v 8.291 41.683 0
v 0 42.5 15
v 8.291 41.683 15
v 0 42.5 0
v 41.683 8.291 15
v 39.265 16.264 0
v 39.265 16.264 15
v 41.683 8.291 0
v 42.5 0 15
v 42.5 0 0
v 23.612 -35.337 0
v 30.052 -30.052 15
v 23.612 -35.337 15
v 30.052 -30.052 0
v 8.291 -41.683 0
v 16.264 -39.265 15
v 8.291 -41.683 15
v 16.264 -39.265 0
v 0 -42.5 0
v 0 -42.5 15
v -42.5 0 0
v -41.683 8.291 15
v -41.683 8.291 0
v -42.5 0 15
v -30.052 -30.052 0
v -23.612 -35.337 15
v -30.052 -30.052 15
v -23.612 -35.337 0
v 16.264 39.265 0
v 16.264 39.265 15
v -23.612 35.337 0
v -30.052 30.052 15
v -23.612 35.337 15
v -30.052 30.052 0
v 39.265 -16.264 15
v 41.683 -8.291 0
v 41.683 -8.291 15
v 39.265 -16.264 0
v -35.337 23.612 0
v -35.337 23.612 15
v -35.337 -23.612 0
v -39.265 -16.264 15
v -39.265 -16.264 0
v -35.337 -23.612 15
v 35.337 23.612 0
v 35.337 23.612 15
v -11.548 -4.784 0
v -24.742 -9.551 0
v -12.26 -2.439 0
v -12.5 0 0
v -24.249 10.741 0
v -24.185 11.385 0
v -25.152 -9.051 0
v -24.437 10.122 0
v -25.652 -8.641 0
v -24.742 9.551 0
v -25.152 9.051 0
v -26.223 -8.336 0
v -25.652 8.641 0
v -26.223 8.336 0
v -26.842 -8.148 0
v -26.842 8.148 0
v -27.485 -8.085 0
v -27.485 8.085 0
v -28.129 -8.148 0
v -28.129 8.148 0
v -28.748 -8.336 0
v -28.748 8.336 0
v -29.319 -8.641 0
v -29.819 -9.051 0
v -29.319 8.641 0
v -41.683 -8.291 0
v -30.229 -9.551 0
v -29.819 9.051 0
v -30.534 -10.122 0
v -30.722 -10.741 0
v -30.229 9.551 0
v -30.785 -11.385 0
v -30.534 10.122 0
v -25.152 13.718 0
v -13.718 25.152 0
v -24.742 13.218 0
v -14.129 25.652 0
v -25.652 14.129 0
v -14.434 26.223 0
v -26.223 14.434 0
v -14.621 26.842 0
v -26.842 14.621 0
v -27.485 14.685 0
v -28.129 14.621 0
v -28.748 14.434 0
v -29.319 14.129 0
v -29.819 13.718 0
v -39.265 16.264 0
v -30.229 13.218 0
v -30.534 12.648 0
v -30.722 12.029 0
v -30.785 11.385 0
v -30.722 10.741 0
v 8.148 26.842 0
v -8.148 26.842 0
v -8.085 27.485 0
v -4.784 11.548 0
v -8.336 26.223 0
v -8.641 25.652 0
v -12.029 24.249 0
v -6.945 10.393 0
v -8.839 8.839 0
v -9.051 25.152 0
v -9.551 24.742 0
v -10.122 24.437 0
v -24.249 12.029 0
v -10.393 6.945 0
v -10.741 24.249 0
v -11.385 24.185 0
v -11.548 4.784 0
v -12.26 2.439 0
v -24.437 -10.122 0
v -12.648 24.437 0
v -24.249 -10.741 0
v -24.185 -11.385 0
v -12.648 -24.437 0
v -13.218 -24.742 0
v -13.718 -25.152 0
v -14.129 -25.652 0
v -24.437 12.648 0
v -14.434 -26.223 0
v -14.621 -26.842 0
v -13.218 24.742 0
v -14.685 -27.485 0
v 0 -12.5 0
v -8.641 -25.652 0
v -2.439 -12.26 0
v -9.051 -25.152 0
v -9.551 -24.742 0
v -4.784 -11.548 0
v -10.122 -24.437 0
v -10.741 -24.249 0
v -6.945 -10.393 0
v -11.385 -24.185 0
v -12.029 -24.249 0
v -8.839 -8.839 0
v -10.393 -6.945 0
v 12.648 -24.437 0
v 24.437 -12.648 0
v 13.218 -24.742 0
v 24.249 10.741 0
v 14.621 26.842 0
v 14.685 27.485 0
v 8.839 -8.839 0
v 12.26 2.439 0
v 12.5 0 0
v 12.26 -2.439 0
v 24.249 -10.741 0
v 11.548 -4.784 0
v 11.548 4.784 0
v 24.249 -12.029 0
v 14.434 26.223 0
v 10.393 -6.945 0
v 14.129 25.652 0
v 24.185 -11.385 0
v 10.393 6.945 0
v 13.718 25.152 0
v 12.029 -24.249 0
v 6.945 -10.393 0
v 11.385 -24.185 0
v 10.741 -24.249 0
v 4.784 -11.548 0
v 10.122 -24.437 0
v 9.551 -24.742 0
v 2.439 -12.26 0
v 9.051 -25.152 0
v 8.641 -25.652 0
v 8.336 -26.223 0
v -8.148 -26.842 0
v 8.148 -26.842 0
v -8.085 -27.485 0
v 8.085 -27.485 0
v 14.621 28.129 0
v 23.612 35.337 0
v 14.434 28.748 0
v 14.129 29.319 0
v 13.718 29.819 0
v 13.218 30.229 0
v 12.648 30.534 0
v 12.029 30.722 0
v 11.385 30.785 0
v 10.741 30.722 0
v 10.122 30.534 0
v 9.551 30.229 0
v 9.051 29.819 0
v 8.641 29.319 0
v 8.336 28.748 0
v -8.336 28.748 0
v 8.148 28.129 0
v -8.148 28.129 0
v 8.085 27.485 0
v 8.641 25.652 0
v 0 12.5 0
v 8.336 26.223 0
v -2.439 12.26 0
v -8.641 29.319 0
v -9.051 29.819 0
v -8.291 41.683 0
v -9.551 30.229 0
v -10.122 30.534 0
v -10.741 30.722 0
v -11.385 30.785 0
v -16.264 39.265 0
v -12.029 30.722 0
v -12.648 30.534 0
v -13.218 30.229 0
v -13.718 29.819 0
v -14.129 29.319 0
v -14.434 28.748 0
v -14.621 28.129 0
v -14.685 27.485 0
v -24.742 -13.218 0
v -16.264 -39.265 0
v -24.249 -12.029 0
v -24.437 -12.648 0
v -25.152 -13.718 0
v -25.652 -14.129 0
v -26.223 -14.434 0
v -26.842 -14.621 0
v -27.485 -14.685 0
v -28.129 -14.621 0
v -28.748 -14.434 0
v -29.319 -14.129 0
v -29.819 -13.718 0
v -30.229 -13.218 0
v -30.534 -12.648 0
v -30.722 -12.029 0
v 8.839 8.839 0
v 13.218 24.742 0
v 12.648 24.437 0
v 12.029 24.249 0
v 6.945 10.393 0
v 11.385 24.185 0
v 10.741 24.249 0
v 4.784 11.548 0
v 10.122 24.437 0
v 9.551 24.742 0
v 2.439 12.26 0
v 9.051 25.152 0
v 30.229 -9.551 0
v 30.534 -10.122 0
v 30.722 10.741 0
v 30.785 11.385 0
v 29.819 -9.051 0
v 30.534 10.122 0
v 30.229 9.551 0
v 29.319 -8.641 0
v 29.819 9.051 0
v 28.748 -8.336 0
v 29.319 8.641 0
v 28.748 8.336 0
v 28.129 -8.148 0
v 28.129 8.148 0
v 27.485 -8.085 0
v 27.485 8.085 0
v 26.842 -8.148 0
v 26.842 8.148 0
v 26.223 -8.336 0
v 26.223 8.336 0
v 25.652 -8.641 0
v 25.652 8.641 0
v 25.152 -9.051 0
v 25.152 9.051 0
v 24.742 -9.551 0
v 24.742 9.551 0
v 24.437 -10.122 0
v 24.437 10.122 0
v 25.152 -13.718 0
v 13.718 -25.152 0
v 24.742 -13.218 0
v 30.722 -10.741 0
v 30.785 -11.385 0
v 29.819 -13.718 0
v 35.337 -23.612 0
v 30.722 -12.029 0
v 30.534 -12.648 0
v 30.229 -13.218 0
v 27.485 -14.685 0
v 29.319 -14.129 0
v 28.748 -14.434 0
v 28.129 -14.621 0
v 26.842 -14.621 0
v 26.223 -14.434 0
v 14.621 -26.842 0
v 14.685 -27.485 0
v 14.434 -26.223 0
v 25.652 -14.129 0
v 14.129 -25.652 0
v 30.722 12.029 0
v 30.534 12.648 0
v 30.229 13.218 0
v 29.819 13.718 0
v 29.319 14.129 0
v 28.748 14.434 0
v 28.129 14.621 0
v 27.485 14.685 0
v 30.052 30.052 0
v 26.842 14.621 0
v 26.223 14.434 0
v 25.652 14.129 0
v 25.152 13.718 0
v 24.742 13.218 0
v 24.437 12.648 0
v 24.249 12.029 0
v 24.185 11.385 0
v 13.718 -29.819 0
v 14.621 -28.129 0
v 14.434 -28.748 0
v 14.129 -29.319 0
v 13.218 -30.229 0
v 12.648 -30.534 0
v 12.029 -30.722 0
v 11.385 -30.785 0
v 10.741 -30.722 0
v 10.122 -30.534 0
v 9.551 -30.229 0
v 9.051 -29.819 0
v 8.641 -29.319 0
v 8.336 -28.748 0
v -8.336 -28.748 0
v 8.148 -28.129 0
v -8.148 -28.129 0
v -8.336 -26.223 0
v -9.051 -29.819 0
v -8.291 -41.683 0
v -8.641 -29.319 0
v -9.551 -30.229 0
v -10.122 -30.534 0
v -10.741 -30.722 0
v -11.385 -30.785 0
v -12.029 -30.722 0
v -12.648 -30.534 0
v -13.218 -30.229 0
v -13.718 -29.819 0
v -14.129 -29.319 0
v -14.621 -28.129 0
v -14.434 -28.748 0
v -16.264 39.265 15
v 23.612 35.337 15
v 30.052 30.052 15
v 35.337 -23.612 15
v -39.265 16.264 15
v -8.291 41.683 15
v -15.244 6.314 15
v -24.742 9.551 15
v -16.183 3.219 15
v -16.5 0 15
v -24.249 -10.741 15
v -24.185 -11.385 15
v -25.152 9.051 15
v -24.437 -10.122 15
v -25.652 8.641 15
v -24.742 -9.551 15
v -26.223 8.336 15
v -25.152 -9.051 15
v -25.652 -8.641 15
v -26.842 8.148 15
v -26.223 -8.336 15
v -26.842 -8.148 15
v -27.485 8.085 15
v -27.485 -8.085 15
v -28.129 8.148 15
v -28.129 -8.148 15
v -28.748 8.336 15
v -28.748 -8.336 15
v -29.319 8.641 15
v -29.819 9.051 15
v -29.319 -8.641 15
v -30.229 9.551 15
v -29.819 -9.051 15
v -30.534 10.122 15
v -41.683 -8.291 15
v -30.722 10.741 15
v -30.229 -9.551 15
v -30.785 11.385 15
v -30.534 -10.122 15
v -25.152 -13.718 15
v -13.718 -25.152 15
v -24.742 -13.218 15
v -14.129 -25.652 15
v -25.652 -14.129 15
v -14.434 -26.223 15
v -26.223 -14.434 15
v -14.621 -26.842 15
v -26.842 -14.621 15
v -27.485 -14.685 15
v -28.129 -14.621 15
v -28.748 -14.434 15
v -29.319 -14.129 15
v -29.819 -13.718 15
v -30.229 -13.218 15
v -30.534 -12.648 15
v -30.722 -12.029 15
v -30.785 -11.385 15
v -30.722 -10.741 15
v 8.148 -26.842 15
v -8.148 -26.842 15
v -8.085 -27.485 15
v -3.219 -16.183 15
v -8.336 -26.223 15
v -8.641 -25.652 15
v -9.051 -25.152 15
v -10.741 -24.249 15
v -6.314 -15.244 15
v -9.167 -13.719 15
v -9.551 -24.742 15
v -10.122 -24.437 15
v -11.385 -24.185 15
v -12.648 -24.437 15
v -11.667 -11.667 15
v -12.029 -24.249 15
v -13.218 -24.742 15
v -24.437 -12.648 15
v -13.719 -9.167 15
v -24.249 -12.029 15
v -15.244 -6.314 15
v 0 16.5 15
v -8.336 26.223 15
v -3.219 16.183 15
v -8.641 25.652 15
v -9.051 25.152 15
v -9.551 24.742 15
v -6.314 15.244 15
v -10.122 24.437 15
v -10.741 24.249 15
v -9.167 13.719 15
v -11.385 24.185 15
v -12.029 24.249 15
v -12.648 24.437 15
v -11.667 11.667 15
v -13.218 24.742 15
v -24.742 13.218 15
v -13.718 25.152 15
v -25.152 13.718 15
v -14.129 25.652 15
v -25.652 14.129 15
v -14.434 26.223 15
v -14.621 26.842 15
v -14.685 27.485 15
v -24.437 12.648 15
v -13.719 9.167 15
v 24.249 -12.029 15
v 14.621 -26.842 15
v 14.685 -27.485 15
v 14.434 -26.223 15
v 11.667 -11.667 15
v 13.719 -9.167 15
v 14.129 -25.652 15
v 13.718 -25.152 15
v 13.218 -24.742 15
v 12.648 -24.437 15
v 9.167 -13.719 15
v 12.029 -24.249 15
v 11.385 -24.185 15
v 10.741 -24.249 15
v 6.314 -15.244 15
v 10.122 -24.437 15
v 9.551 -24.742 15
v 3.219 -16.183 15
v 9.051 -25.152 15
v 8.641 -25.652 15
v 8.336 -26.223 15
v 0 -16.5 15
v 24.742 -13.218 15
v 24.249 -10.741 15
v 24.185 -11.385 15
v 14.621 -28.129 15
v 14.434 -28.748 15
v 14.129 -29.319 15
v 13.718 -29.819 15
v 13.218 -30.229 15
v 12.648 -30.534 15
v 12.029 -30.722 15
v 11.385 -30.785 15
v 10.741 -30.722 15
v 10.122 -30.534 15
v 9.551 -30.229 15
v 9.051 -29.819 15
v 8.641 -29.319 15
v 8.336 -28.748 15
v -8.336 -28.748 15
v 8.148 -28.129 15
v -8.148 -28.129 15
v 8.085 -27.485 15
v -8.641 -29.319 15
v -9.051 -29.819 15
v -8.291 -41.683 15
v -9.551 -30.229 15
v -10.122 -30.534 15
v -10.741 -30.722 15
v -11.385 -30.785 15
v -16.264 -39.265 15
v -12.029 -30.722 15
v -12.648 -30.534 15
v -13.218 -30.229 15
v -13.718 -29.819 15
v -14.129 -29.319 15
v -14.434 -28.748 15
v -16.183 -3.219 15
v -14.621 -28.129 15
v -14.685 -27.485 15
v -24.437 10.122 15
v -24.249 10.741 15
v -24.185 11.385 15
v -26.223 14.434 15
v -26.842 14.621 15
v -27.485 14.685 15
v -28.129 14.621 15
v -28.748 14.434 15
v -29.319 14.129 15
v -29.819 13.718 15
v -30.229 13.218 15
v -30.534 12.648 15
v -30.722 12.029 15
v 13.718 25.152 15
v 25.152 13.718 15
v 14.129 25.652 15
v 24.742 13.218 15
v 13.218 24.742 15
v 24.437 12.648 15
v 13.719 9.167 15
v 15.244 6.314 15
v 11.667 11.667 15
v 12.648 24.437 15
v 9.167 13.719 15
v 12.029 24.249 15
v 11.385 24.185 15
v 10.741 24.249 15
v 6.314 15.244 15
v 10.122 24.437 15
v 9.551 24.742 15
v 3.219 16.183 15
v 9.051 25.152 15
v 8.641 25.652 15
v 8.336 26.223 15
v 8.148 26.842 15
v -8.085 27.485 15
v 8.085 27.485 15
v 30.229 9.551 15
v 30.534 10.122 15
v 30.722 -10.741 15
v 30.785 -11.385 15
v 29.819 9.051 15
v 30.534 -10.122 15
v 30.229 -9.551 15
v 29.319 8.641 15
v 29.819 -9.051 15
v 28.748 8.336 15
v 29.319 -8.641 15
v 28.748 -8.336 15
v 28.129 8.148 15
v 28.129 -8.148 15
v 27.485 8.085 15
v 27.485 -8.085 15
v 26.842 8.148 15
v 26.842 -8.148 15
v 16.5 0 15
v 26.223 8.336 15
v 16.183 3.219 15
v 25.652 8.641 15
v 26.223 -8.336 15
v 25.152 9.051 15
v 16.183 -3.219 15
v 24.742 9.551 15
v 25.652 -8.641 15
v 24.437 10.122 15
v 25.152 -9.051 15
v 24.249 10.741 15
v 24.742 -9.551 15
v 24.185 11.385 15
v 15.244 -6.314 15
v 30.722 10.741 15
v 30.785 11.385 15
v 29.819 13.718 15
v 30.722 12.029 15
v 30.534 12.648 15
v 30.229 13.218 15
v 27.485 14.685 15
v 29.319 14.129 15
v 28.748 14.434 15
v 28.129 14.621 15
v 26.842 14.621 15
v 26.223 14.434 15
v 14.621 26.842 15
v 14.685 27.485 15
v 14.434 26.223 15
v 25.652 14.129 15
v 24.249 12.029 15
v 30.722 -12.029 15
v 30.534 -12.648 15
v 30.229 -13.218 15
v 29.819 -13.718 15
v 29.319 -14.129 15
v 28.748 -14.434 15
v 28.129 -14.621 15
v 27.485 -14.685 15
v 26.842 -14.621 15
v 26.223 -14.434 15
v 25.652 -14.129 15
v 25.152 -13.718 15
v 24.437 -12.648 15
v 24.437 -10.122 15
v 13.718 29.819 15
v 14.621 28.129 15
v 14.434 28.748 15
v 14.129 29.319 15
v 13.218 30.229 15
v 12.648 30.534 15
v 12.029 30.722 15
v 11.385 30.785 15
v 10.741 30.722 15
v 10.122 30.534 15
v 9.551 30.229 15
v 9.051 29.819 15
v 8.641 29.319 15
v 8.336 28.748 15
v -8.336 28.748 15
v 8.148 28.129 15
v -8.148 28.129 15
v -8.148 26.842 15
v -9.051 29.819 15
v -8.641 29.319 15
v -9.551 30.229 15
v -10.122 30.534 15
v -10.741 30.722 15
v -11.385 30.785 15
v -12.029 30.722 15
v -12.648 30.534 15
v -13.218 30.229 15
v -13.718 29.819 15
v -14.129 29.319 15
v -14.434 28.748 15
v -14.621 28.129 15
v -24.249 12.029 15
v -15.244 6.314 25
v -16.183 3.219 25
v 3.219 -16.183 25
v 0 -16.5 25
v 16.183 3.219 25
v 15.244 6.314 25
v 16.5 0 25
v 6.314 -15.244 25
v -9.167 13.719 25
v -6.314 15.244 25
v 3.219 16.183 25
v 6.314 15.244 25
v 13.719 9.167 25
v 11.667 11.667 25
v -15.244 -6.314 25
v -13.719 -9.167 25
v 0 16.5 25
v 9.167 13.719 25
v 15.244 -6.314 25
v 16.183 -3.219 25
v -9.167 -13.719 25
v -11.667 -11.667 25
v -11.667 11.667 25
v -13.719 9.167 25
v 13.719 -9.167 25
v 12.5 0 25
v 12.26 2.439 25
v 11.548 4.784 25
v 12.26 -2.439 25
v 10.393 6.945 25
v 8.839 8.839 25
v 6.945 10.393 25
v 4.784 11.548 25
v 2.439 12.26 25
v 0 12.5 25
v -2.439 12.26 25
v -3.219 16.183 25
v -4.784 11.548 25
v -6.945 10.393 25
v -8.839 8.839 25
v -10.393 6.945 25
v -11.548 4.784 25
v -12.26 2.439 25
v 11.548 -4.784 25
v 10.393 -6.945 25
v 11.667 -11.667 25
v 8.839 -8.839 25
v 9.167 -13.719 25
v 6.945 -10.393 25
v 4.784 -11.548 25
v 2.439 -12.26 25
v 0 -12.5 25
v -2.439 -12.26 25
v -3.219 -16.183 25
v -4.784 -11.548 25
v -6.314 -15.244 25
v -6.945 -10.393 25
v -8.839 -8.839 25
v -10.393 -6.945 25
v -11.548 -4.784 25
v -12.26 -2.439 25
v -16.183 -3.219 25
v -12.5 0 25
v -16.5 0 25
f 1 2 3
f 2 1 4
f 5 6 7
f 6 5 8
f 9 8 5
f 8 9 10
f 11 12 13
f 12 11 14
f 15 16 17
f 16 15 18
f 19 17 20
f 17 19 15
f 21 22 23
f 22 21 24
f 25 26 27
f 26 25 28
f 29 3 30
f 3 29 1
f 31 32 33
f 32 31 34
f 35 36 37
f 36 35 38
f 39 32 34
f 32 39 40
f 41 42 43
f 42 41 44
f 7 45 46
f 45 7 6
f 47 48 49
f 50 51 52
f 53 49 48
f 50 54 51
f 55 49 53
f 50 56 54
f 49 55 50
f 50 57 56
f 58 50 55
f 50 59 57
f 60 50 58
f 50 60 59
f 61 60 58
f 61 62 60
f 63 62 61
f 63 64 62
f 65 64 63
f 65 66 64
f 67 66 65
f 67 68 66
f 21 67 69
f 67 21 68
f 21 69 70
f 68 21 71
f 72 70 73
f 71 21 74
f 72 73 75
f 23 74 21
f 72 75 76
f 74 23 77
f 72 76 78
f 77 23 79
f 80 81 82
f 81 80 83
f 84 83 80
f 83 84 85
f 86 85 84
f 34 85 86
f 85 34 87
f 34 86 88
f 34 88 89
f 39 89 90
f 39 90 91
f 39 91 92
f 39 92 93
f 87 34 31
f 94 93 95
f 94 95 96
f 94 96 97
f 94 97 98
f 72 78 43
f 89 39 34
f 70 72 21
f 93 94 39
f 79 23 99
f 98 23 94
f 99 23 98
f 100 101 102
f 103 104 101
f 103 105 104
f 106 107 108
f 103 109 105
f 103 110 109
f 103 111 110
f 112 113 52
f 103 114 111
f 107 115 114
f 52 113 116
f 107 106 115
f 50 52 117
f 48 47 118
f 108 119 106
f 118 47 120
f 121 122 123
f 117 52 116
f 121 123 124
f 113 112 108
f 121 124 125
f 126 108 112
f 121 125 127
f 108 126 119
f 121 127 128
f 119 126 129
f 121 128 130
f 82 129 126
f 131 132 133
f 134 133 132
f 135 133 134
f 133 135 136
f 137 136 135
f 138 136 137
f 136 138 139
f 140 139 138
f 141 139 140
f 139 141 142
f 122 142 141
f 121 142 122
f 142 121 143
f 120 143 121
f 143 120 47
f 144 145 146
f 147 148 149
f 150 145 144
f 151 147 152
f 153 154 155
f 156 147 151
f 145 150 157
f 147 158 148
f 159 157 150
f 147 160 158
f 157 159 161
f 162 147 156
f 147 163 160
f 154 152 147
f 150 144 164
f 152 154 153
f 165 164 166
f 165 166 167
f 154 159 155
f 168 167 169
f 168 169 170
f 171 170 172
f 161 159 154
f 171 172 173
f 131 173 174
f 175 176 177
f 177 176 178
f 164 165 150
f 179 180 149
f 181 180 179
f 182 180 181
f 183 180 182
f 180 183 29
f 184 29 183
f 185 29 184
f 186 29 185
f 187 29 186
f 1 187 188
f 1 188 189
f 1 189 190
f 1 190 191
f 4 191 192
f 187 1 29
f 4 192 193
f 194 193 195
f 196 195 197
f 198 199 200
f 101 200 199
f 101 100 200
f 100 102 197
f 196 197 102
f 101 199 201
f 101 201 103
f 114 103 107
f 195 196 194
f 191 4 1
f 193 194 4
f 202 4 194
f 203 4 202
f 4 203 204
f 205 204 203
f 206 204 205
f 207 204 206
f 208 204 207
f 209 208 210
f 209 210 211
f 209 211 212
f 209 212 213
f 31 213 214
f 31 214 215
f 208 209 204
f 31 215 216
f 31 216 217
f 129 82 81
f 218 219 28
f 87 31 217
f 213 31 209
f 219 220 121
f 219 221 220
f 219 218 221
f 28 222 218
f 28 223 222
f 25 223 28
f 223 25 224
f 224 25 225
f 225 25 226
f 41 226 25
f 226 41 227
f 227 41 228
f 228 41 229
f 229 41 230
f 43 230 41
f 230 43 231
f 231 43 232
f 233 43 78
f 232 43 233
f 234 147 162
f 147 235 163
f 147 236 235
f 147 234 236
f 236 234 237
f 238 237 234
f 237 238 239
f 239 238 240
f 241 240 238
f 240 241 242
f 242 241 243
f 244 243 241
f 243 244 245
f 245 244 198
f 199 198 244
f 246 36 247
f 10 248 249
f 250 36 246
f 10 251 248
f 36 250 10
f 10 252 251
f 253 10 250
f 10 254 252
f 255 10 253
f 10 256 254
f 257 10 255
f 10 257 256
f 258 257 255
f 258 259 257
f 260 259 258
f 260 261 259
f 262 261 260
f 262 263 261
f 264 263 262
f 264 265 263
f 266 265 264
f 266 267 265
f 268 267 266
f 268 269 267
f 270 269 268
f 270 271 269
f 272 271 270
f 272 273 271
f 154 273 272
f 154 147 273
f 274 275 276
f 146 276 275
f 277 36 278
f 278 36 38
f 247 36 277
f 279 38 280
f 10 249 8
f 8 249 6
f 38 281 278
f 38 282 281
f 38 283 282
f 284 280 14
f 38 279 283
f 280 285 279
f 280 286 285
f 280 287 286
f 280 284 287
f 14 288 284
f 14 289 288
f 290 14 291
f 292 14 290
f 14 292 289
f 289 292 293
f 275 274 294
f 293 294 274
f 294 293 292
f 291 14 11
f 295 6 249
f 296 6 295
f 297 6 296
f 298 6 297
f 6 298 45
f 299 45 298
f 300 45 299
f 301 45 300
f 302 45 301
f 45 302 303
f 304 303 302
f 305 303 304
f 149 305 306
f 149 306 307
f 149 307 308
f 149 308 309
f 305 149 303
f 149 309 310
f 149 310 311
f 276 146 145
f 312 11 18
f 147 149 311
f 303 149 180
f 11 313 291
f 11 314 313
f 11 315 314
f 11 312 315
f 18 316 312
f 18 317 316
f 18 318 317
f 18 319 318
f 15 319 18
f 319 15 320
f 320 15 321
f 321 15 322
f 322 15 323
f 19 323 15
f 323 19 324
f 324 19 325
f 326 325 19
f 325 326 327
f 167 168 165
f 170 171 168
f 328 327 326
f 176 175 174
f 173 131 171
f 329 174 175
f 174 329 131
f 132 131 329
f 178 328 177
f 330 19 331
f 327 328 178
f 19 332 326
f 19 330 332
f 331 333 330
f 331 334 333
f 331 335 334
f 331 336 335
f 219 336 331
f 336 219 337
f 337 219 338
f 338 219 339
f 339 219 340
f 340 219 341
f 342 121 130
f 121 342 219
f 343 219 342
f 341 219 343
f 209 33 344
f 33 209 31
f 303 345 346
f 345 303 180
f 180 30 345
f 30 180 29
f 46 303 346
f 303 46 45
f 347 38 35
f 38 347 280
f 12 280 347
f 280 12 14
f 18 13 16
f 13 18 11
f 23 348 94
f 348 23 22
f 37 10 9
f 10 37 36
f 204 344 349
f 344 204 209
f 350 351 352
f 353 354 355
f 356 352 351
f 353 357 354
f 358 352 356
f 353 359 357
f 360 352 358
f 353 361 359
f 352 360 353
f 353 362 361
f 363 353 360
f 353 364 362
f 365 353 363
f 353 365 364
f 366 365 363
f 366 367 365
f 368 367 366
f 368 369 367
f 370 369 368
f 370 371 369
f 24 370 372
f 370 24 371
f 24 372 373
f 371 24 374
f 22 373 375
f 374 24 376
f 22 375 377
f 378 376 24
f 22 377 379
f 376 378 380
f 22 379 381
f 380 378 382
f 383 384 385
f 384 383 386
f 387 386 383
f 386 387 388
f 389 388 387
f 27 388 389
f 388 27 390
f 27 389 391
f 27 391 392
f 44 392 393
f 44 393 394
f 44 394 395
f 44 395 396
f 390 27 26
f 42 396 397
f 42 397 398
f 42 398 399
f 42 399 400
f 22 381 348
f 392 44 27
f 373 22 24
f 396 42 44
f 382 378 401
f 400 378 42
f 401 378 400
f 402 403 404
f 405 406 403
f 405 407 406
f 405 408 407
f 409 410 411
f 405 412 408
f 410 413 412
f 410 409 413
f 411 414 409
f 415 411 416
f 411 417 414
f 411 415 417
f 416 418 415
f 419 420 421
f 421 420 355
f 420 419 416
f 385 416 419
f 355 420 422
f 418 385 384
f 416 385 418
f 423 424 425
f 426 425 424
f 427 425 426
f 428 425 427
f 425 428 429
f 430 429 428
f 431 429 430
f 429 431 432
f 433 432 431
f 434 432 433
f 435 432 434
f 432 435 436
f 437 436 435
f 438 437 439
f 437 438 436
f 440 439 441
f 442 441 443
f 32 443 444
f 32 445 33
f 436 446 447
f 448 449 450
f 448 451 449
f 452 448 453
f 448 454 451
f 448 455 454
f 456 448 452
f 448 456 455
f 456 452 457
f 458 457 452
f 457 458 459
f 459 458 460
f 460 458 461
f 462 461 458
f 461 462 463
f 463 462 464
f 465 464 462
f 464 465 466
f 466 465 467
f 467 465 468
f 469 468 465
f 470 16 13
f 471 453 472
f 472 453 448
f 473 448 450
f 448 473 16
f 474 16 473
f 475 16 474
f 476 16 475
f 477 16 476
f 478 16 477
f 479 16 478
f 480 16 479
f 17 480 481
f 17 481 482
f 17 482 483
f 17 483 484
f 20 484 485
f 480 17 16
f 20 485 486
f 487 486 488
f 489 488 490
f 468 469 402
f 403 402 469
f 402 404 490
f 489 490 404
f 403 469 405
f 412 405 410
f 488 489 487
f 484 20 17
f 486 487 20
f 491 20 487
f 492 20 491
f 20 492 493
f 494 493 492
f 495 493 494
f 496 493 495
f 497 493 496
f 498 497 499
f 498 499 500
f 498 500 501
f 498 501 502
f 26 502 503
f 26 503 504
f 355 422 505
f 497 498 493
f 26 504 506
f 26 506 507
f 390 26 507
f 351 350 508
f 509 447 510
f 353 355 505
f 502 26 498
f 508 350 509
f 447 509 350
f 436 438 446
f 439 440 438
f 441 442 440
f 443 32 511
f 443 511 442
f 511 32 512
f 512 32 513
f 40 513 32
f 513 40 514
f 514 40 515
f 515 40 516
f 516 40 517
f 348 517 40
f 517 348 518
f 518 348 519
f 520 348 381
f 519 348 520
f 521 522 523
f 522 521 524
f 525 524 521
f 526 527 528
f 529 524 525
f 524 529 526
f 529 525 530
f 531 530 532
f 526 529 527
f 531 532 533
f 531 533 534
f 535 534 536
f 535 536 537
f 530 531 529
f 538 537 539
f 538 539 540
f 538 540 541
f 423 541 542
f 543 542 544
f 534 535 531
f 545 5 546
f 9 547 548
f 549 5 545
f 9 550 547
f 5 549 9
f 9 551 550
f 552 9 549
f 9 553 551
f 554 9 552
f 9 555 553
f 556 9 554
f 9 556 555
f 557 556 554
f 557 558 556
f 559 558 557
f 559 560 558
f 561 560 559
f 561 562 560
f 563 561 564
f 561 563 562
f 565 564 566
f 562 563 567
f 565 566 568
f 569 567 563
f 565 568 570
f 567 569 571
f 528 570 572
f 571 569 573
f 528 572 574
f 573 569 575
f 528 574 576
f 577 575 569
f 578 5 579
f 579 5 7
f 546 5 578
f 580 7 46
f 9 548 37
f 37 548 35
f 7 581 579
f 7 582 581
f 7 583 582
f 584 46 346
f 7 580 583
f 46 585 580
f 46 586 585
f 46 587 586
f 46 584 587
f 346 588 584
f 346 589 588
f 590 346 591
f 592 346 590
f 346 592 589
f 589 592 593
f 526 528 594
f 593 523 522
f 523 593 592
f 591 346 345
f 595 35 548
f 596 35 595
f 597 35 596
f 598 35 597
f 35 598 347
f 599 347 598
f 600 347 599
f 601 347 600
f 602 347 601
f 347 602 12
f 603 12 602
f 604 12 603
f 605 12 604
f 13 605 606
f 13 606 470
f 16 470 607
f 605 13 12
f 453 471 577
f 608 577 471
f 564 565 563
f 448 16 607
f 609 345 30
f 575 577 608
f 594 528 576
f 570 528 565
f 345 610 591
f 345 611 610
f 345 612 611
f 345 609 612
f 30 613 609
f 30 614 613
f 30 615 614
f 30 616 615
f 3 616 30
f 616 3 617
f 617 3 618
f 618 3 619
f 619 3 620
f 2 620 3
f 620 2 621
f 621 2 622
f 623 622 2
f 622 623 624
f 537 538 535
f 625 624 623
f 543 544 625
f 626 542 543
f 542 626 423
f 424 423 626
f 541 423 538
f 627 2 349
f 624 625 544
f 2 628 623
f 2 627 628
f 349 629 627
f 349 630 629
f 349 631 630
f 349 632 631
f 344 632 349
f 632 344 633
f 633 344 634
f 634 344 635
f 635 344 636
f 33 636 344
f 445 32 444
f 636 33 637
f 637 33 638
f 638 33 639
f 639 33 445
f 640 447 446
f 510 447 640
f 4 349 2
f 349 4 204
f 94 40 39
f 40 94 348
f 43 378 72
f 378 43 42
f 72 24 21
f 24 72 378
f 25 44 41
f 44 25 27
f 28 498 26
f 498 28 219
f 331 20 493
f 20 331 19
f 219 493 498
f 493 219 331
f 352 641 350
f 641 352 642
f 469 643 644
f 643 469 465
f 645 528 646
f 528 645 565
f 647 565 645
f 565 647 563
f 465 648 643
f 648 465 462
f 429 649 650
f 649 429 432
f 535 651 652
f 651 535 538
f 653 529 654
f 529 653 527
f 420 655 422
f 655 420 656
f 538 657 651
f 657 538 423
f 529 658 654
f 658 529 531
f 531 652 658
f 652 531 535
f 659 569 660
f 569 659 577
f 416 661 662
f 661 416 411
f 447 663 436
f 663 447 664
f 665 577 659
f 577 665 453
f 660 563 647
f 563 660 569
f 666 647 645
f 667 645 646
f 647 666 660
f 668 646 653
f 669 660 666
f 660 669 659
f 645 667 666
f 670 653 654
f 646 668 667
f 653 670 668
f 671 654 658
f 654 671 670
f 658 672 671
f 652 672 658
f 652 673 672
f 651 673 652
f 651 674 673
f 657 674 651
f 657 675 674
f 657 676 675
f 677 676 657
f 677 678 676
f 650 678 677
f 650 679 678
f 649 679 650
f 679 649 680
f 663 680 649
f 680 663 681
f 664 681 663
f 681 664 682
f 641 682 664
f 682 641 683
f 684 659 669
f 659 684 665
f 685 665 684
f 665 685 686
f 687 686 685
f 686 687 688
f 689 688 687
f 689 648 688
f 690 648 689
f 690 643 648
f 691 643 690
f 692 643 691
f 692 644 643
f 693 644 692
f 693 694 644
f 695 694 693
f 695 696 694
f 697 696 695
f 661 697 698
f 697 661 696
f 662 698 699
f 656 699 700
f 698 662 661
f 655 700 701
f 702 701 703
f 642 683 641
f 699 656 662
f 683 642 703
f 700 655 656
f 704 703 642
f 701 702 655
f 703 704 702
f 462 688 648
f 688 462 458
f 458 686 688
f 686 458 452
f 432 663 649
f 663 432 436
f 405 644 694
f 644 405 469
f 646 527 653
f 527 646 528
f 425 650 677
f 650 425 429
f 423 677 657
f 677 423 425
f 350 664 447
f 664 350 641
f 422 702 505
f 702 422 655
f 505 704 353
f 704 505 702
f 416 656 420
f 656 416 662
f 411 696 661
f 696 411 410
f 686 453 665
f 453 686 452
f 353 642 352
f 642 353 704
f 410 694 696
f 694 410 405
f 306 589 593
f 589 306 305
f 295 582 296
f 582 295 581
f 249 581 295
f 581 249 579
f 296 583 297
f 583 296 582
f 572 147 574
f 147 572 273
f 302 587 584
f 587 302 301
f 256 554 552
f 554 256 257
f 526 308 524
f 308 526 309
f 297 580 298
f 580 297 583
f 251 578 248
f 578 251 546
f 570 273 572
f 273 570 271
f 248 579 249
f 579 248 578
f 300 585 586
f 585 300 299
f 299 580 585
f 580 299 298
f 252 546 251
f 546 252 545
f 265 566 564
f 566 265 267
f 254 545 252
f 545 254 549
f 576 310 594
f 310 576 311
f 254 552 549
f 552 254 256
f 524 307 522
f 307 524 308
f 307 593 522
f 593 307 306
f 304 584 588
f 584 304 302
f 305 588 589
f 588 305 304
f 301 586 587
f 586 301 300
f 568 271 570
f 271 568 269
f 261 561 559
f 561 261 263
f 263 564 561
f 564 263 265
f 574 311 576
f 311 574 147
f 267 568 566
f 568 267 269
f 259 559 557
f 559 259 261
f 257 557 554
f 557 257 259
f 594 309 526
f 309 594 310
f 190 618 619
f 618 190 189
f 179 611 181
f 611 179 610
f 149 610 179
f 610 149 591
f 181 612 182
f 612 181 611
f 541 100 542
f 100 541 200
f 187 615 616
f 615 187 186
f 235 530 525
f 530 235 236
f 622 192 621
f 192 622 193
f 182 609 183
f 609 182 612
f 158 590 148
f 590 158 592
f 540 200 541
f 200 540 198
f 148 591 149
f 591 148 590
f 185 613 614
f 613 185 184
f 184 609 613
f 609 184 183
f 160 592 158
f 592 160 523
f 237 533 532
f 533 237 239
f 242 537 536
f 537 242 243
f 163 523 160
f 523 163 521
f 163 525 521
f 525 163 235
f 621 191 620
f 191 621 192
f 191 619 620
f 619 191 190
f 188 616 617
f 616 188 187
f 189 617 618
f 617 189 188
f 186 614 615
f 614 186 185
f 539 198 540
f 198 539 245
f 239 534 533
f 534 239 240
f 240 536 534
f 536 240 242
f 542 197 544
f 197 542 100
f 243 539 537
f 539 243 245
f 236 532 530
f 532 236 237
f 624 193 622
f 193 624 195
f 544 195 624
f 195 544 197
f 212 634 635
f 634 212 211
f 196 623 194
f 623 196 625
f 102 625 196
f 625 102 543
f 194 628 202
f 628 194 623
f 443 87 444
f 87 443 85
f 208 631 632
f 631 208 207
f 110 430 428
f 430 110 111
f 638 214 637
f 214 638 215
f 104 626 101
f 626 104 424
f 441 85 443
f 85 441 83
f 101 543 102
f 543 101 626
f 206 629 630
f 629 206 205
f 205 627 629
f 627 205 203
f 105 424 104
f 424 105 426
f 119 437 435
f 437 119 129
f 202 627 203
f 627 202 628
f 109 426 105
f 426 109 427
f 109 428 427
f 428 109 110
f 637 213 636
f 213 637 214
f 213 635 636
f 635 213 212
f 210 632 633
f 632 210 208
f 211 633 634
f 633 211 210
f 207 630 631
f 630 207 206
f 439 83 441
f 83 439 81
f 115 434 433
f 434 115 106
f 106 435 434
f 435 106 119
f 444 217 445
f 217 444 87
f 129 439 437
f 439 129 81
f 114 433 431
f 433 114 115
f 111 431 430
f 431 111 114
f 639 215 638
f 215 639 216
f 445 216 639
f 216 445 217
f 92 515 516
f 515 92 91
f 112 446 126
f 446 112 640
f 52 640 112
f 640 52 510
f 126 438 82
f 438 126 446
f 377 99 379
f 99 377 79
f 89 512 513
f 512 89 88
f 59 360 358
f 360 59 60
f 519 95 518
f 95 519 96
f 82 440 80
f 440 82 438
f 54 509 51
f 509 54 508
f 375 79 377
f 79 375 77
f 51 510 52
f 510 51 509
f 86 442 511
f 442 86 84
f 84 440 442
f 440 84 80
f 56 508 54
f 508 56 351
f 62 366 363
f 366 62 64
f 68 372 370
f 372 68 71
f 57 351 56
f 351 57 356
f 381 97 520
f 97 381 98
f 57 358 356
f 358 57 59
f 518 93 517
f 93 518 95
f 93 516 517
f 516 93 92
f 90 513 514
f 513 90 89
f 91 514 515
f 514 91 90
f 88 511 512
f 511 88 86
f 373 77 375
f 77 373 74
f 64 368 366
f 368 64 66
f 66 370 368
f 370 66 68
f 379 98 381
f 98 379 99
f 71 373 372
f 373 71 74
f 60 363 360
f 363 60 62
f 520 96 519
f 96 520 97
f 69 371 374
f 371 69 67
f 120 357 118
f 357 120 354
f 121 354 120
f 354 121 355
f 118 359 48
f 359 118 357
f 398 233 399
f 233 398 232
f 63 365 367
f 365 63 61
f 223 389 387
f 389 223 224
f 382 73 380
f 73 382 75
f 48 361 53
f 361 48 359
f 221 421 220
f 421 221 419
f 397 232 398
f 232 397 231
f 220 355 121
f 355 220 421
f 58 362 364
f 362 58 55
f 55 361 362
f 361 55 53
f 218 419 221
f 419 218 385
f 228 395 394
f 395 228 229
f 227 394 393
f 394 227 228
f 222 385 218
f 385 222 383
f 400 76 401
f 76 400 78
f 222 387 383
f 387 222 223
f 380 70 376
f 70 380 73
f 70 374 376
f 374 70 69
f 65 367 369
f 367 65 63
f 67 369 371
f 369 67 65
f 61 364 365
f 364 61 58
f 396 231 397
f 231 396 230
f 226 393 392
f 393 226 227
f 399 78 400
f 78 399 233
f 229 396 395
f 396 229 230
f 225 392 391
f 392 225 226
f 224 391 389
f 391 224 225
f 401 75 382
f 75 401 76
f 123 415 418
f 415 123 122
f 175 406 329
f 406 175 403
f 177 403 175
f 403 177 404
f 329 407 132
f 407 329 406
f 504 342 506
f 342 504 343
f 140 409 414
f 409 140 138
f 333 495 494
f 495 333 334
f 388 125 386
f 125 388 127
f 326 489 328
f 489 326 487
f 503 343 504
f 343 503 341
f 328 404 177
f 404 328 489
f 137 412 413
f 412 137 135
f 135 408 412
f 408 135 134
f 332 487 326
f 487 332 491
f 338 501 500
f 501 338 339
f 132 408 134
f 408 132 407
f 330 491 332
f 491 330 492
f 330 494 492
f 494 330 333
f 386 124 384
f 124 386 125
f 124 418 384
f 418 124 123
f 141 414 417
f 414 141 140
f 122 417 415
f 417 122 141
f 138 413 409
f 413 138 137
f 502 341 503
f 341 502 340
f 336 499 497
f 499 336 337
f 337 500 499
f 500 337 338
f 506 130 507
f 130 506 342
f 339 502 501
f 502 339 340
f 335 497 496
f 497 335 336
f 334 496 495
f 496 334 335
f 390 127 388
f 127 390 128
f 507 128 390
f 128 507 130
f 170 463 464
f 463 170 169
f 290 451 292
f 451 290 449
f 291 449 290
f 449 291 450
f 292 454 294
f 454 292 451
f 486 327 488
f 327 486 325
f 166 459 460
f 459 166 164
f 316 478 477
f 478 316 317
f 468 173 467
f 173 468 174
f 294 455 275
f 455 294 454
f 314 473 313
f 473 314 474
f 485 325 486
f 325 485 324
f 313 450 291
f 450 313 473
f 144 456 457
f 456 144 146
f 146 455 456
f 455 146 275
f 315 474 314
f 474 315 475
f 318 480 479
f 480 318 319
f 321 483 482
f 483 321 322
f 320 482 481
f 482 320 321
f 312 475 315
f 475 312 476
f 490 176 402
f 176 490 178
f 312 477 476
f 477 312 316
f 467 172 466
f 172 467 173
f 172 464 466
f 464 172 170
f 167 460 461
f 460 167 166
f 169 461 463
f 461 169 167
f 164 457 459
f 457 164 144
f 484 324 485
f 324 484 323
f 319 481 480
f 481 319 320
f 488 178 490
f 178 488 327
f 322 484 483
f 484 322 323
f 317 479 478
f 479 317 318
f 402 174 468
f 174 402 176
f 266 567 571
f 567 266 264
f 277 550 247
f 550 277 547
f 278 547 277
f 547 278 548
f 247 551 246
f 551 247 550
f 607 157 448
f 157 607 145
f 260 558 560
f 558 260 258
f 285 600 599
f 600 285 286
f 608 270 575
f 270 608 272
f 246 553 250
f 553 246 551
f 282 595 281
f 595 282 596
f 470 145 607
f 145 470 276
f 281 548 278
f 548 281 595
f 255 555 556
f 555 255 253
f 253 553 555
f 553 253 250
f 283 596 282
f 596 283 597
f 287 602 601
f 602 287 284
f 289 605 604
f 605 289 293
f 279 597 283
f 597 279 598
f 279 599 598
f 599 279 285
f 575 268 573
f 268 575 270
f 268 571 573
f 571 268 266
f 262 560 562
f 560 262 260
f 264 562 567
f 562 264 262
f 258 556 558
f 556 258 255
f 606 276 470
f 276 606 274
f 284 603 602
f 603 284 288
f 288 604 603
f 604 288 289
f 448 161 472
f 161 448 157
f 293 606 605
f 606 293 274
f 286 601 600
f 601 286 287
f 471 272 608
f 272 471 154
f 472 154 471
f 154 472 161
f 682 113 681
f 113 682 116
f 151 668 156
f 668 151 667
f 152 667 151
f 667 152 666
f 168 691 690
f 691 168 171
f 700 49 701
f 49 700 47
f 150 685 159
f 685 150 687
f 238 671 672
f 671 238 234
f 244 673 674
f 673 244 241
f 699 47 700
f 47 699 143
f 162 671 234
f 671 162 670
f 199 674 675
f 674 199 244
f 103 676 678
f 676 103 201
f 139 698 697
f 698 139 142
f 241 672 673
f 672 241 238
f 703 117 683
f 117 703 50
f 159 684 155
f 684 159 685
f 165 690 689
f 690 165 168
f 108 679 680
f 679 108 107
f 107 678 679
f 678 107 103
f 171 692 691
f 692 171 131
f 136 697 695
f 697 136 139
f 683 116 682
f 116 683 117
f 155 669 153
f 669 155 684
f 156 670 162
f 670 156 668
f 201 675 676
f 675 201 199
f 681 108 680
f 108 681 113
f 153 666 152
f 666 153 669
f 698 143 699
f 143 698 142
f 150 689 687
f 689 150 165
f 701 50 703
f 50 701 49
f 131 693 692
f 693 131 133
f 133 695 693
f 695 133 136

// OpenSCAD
$fn = 32;

// ----------------------------------------------------------------------
// Flange Ø85 x 15
// 8 holes on a Ø59.5 bolt circle, bolted joints
// ----------------------------------------------------------------------

// --- parameters (mm) ---
flange_d = 85;     // outside diameter of the flange
thickness = 15;    // flange thickness
holes = 8;         // number of bolt holes
pcd = 59.5;        // bolt circle diameter
start_deg = 22.5;  // angle of the first hole, from +X
hole_d = 6.6;      // bolt hole diameter
bore_d = 25;       // central through bore
hub_d = 33;        // hub outside diameter
hub_h = 10;        // hub height above the flange face (0 = no hub)

// --- derived feature positions (mm) ---
height = thickness + hub_h;  // = 25   overall height of the part
pcd_r = pcd / 2;             // = 29.75   bolt circle radius
hole_step = 360 / holes;     // = 45   angular pitch
feature_centers = [
  [pcd_r * cos(start_deg + 0 * hole_step), pcd_r * sin(start_deg + 0 * hole_step)],
  [pcd_r * cos(start_deg + 1 * hole_step), pcd_r * sin(start_deg + 1 * hole_step)],
  [pcd_r * cos(start_deg + 2 * hole_step), pcd_r * sin(start_deg + 2 * hole_step)],
  [pcd_r * cos(start_deg + 3 * hole_step), pcd_r * sin(start_deg + 3 * hole_step)],
  [pcd_r * cos(start_deg + 4 * hole_step), pcd_r * sin(start_deg + 4 * hole_step)],
  [pcd_r * cos(start_deg + 5 * hole_step), pcd_r * sin(start_deg + 5 * hole_step)],
  [pcd_r * cos(start_deg + 6 * hole_step), pcd_r * sin(start_deg + 6 * hole_step)],
  [pcd_r * cos(start_deg + 7 * hole_step), pcd_r * sin(start_deg + 7 * hole_step)]
];   // bolt hole centres on the pitch circle

// flange disc, every hole and the bore cut straight through
difference() {
  union() {
    cylinder(d = flange_d, h = thickness);
    cylinder(d = hub_d, h = height);  // hub, overlapped into the flange
  }
  translate([0, 0, -1]) cylinder(d = bore_d, h = height + 2);  // bore, through
  for (centre = feature_centers)
    translate([centre[0], centre[1], -1]) cylinder(d = hole_d, h = thickness + 2);
}
